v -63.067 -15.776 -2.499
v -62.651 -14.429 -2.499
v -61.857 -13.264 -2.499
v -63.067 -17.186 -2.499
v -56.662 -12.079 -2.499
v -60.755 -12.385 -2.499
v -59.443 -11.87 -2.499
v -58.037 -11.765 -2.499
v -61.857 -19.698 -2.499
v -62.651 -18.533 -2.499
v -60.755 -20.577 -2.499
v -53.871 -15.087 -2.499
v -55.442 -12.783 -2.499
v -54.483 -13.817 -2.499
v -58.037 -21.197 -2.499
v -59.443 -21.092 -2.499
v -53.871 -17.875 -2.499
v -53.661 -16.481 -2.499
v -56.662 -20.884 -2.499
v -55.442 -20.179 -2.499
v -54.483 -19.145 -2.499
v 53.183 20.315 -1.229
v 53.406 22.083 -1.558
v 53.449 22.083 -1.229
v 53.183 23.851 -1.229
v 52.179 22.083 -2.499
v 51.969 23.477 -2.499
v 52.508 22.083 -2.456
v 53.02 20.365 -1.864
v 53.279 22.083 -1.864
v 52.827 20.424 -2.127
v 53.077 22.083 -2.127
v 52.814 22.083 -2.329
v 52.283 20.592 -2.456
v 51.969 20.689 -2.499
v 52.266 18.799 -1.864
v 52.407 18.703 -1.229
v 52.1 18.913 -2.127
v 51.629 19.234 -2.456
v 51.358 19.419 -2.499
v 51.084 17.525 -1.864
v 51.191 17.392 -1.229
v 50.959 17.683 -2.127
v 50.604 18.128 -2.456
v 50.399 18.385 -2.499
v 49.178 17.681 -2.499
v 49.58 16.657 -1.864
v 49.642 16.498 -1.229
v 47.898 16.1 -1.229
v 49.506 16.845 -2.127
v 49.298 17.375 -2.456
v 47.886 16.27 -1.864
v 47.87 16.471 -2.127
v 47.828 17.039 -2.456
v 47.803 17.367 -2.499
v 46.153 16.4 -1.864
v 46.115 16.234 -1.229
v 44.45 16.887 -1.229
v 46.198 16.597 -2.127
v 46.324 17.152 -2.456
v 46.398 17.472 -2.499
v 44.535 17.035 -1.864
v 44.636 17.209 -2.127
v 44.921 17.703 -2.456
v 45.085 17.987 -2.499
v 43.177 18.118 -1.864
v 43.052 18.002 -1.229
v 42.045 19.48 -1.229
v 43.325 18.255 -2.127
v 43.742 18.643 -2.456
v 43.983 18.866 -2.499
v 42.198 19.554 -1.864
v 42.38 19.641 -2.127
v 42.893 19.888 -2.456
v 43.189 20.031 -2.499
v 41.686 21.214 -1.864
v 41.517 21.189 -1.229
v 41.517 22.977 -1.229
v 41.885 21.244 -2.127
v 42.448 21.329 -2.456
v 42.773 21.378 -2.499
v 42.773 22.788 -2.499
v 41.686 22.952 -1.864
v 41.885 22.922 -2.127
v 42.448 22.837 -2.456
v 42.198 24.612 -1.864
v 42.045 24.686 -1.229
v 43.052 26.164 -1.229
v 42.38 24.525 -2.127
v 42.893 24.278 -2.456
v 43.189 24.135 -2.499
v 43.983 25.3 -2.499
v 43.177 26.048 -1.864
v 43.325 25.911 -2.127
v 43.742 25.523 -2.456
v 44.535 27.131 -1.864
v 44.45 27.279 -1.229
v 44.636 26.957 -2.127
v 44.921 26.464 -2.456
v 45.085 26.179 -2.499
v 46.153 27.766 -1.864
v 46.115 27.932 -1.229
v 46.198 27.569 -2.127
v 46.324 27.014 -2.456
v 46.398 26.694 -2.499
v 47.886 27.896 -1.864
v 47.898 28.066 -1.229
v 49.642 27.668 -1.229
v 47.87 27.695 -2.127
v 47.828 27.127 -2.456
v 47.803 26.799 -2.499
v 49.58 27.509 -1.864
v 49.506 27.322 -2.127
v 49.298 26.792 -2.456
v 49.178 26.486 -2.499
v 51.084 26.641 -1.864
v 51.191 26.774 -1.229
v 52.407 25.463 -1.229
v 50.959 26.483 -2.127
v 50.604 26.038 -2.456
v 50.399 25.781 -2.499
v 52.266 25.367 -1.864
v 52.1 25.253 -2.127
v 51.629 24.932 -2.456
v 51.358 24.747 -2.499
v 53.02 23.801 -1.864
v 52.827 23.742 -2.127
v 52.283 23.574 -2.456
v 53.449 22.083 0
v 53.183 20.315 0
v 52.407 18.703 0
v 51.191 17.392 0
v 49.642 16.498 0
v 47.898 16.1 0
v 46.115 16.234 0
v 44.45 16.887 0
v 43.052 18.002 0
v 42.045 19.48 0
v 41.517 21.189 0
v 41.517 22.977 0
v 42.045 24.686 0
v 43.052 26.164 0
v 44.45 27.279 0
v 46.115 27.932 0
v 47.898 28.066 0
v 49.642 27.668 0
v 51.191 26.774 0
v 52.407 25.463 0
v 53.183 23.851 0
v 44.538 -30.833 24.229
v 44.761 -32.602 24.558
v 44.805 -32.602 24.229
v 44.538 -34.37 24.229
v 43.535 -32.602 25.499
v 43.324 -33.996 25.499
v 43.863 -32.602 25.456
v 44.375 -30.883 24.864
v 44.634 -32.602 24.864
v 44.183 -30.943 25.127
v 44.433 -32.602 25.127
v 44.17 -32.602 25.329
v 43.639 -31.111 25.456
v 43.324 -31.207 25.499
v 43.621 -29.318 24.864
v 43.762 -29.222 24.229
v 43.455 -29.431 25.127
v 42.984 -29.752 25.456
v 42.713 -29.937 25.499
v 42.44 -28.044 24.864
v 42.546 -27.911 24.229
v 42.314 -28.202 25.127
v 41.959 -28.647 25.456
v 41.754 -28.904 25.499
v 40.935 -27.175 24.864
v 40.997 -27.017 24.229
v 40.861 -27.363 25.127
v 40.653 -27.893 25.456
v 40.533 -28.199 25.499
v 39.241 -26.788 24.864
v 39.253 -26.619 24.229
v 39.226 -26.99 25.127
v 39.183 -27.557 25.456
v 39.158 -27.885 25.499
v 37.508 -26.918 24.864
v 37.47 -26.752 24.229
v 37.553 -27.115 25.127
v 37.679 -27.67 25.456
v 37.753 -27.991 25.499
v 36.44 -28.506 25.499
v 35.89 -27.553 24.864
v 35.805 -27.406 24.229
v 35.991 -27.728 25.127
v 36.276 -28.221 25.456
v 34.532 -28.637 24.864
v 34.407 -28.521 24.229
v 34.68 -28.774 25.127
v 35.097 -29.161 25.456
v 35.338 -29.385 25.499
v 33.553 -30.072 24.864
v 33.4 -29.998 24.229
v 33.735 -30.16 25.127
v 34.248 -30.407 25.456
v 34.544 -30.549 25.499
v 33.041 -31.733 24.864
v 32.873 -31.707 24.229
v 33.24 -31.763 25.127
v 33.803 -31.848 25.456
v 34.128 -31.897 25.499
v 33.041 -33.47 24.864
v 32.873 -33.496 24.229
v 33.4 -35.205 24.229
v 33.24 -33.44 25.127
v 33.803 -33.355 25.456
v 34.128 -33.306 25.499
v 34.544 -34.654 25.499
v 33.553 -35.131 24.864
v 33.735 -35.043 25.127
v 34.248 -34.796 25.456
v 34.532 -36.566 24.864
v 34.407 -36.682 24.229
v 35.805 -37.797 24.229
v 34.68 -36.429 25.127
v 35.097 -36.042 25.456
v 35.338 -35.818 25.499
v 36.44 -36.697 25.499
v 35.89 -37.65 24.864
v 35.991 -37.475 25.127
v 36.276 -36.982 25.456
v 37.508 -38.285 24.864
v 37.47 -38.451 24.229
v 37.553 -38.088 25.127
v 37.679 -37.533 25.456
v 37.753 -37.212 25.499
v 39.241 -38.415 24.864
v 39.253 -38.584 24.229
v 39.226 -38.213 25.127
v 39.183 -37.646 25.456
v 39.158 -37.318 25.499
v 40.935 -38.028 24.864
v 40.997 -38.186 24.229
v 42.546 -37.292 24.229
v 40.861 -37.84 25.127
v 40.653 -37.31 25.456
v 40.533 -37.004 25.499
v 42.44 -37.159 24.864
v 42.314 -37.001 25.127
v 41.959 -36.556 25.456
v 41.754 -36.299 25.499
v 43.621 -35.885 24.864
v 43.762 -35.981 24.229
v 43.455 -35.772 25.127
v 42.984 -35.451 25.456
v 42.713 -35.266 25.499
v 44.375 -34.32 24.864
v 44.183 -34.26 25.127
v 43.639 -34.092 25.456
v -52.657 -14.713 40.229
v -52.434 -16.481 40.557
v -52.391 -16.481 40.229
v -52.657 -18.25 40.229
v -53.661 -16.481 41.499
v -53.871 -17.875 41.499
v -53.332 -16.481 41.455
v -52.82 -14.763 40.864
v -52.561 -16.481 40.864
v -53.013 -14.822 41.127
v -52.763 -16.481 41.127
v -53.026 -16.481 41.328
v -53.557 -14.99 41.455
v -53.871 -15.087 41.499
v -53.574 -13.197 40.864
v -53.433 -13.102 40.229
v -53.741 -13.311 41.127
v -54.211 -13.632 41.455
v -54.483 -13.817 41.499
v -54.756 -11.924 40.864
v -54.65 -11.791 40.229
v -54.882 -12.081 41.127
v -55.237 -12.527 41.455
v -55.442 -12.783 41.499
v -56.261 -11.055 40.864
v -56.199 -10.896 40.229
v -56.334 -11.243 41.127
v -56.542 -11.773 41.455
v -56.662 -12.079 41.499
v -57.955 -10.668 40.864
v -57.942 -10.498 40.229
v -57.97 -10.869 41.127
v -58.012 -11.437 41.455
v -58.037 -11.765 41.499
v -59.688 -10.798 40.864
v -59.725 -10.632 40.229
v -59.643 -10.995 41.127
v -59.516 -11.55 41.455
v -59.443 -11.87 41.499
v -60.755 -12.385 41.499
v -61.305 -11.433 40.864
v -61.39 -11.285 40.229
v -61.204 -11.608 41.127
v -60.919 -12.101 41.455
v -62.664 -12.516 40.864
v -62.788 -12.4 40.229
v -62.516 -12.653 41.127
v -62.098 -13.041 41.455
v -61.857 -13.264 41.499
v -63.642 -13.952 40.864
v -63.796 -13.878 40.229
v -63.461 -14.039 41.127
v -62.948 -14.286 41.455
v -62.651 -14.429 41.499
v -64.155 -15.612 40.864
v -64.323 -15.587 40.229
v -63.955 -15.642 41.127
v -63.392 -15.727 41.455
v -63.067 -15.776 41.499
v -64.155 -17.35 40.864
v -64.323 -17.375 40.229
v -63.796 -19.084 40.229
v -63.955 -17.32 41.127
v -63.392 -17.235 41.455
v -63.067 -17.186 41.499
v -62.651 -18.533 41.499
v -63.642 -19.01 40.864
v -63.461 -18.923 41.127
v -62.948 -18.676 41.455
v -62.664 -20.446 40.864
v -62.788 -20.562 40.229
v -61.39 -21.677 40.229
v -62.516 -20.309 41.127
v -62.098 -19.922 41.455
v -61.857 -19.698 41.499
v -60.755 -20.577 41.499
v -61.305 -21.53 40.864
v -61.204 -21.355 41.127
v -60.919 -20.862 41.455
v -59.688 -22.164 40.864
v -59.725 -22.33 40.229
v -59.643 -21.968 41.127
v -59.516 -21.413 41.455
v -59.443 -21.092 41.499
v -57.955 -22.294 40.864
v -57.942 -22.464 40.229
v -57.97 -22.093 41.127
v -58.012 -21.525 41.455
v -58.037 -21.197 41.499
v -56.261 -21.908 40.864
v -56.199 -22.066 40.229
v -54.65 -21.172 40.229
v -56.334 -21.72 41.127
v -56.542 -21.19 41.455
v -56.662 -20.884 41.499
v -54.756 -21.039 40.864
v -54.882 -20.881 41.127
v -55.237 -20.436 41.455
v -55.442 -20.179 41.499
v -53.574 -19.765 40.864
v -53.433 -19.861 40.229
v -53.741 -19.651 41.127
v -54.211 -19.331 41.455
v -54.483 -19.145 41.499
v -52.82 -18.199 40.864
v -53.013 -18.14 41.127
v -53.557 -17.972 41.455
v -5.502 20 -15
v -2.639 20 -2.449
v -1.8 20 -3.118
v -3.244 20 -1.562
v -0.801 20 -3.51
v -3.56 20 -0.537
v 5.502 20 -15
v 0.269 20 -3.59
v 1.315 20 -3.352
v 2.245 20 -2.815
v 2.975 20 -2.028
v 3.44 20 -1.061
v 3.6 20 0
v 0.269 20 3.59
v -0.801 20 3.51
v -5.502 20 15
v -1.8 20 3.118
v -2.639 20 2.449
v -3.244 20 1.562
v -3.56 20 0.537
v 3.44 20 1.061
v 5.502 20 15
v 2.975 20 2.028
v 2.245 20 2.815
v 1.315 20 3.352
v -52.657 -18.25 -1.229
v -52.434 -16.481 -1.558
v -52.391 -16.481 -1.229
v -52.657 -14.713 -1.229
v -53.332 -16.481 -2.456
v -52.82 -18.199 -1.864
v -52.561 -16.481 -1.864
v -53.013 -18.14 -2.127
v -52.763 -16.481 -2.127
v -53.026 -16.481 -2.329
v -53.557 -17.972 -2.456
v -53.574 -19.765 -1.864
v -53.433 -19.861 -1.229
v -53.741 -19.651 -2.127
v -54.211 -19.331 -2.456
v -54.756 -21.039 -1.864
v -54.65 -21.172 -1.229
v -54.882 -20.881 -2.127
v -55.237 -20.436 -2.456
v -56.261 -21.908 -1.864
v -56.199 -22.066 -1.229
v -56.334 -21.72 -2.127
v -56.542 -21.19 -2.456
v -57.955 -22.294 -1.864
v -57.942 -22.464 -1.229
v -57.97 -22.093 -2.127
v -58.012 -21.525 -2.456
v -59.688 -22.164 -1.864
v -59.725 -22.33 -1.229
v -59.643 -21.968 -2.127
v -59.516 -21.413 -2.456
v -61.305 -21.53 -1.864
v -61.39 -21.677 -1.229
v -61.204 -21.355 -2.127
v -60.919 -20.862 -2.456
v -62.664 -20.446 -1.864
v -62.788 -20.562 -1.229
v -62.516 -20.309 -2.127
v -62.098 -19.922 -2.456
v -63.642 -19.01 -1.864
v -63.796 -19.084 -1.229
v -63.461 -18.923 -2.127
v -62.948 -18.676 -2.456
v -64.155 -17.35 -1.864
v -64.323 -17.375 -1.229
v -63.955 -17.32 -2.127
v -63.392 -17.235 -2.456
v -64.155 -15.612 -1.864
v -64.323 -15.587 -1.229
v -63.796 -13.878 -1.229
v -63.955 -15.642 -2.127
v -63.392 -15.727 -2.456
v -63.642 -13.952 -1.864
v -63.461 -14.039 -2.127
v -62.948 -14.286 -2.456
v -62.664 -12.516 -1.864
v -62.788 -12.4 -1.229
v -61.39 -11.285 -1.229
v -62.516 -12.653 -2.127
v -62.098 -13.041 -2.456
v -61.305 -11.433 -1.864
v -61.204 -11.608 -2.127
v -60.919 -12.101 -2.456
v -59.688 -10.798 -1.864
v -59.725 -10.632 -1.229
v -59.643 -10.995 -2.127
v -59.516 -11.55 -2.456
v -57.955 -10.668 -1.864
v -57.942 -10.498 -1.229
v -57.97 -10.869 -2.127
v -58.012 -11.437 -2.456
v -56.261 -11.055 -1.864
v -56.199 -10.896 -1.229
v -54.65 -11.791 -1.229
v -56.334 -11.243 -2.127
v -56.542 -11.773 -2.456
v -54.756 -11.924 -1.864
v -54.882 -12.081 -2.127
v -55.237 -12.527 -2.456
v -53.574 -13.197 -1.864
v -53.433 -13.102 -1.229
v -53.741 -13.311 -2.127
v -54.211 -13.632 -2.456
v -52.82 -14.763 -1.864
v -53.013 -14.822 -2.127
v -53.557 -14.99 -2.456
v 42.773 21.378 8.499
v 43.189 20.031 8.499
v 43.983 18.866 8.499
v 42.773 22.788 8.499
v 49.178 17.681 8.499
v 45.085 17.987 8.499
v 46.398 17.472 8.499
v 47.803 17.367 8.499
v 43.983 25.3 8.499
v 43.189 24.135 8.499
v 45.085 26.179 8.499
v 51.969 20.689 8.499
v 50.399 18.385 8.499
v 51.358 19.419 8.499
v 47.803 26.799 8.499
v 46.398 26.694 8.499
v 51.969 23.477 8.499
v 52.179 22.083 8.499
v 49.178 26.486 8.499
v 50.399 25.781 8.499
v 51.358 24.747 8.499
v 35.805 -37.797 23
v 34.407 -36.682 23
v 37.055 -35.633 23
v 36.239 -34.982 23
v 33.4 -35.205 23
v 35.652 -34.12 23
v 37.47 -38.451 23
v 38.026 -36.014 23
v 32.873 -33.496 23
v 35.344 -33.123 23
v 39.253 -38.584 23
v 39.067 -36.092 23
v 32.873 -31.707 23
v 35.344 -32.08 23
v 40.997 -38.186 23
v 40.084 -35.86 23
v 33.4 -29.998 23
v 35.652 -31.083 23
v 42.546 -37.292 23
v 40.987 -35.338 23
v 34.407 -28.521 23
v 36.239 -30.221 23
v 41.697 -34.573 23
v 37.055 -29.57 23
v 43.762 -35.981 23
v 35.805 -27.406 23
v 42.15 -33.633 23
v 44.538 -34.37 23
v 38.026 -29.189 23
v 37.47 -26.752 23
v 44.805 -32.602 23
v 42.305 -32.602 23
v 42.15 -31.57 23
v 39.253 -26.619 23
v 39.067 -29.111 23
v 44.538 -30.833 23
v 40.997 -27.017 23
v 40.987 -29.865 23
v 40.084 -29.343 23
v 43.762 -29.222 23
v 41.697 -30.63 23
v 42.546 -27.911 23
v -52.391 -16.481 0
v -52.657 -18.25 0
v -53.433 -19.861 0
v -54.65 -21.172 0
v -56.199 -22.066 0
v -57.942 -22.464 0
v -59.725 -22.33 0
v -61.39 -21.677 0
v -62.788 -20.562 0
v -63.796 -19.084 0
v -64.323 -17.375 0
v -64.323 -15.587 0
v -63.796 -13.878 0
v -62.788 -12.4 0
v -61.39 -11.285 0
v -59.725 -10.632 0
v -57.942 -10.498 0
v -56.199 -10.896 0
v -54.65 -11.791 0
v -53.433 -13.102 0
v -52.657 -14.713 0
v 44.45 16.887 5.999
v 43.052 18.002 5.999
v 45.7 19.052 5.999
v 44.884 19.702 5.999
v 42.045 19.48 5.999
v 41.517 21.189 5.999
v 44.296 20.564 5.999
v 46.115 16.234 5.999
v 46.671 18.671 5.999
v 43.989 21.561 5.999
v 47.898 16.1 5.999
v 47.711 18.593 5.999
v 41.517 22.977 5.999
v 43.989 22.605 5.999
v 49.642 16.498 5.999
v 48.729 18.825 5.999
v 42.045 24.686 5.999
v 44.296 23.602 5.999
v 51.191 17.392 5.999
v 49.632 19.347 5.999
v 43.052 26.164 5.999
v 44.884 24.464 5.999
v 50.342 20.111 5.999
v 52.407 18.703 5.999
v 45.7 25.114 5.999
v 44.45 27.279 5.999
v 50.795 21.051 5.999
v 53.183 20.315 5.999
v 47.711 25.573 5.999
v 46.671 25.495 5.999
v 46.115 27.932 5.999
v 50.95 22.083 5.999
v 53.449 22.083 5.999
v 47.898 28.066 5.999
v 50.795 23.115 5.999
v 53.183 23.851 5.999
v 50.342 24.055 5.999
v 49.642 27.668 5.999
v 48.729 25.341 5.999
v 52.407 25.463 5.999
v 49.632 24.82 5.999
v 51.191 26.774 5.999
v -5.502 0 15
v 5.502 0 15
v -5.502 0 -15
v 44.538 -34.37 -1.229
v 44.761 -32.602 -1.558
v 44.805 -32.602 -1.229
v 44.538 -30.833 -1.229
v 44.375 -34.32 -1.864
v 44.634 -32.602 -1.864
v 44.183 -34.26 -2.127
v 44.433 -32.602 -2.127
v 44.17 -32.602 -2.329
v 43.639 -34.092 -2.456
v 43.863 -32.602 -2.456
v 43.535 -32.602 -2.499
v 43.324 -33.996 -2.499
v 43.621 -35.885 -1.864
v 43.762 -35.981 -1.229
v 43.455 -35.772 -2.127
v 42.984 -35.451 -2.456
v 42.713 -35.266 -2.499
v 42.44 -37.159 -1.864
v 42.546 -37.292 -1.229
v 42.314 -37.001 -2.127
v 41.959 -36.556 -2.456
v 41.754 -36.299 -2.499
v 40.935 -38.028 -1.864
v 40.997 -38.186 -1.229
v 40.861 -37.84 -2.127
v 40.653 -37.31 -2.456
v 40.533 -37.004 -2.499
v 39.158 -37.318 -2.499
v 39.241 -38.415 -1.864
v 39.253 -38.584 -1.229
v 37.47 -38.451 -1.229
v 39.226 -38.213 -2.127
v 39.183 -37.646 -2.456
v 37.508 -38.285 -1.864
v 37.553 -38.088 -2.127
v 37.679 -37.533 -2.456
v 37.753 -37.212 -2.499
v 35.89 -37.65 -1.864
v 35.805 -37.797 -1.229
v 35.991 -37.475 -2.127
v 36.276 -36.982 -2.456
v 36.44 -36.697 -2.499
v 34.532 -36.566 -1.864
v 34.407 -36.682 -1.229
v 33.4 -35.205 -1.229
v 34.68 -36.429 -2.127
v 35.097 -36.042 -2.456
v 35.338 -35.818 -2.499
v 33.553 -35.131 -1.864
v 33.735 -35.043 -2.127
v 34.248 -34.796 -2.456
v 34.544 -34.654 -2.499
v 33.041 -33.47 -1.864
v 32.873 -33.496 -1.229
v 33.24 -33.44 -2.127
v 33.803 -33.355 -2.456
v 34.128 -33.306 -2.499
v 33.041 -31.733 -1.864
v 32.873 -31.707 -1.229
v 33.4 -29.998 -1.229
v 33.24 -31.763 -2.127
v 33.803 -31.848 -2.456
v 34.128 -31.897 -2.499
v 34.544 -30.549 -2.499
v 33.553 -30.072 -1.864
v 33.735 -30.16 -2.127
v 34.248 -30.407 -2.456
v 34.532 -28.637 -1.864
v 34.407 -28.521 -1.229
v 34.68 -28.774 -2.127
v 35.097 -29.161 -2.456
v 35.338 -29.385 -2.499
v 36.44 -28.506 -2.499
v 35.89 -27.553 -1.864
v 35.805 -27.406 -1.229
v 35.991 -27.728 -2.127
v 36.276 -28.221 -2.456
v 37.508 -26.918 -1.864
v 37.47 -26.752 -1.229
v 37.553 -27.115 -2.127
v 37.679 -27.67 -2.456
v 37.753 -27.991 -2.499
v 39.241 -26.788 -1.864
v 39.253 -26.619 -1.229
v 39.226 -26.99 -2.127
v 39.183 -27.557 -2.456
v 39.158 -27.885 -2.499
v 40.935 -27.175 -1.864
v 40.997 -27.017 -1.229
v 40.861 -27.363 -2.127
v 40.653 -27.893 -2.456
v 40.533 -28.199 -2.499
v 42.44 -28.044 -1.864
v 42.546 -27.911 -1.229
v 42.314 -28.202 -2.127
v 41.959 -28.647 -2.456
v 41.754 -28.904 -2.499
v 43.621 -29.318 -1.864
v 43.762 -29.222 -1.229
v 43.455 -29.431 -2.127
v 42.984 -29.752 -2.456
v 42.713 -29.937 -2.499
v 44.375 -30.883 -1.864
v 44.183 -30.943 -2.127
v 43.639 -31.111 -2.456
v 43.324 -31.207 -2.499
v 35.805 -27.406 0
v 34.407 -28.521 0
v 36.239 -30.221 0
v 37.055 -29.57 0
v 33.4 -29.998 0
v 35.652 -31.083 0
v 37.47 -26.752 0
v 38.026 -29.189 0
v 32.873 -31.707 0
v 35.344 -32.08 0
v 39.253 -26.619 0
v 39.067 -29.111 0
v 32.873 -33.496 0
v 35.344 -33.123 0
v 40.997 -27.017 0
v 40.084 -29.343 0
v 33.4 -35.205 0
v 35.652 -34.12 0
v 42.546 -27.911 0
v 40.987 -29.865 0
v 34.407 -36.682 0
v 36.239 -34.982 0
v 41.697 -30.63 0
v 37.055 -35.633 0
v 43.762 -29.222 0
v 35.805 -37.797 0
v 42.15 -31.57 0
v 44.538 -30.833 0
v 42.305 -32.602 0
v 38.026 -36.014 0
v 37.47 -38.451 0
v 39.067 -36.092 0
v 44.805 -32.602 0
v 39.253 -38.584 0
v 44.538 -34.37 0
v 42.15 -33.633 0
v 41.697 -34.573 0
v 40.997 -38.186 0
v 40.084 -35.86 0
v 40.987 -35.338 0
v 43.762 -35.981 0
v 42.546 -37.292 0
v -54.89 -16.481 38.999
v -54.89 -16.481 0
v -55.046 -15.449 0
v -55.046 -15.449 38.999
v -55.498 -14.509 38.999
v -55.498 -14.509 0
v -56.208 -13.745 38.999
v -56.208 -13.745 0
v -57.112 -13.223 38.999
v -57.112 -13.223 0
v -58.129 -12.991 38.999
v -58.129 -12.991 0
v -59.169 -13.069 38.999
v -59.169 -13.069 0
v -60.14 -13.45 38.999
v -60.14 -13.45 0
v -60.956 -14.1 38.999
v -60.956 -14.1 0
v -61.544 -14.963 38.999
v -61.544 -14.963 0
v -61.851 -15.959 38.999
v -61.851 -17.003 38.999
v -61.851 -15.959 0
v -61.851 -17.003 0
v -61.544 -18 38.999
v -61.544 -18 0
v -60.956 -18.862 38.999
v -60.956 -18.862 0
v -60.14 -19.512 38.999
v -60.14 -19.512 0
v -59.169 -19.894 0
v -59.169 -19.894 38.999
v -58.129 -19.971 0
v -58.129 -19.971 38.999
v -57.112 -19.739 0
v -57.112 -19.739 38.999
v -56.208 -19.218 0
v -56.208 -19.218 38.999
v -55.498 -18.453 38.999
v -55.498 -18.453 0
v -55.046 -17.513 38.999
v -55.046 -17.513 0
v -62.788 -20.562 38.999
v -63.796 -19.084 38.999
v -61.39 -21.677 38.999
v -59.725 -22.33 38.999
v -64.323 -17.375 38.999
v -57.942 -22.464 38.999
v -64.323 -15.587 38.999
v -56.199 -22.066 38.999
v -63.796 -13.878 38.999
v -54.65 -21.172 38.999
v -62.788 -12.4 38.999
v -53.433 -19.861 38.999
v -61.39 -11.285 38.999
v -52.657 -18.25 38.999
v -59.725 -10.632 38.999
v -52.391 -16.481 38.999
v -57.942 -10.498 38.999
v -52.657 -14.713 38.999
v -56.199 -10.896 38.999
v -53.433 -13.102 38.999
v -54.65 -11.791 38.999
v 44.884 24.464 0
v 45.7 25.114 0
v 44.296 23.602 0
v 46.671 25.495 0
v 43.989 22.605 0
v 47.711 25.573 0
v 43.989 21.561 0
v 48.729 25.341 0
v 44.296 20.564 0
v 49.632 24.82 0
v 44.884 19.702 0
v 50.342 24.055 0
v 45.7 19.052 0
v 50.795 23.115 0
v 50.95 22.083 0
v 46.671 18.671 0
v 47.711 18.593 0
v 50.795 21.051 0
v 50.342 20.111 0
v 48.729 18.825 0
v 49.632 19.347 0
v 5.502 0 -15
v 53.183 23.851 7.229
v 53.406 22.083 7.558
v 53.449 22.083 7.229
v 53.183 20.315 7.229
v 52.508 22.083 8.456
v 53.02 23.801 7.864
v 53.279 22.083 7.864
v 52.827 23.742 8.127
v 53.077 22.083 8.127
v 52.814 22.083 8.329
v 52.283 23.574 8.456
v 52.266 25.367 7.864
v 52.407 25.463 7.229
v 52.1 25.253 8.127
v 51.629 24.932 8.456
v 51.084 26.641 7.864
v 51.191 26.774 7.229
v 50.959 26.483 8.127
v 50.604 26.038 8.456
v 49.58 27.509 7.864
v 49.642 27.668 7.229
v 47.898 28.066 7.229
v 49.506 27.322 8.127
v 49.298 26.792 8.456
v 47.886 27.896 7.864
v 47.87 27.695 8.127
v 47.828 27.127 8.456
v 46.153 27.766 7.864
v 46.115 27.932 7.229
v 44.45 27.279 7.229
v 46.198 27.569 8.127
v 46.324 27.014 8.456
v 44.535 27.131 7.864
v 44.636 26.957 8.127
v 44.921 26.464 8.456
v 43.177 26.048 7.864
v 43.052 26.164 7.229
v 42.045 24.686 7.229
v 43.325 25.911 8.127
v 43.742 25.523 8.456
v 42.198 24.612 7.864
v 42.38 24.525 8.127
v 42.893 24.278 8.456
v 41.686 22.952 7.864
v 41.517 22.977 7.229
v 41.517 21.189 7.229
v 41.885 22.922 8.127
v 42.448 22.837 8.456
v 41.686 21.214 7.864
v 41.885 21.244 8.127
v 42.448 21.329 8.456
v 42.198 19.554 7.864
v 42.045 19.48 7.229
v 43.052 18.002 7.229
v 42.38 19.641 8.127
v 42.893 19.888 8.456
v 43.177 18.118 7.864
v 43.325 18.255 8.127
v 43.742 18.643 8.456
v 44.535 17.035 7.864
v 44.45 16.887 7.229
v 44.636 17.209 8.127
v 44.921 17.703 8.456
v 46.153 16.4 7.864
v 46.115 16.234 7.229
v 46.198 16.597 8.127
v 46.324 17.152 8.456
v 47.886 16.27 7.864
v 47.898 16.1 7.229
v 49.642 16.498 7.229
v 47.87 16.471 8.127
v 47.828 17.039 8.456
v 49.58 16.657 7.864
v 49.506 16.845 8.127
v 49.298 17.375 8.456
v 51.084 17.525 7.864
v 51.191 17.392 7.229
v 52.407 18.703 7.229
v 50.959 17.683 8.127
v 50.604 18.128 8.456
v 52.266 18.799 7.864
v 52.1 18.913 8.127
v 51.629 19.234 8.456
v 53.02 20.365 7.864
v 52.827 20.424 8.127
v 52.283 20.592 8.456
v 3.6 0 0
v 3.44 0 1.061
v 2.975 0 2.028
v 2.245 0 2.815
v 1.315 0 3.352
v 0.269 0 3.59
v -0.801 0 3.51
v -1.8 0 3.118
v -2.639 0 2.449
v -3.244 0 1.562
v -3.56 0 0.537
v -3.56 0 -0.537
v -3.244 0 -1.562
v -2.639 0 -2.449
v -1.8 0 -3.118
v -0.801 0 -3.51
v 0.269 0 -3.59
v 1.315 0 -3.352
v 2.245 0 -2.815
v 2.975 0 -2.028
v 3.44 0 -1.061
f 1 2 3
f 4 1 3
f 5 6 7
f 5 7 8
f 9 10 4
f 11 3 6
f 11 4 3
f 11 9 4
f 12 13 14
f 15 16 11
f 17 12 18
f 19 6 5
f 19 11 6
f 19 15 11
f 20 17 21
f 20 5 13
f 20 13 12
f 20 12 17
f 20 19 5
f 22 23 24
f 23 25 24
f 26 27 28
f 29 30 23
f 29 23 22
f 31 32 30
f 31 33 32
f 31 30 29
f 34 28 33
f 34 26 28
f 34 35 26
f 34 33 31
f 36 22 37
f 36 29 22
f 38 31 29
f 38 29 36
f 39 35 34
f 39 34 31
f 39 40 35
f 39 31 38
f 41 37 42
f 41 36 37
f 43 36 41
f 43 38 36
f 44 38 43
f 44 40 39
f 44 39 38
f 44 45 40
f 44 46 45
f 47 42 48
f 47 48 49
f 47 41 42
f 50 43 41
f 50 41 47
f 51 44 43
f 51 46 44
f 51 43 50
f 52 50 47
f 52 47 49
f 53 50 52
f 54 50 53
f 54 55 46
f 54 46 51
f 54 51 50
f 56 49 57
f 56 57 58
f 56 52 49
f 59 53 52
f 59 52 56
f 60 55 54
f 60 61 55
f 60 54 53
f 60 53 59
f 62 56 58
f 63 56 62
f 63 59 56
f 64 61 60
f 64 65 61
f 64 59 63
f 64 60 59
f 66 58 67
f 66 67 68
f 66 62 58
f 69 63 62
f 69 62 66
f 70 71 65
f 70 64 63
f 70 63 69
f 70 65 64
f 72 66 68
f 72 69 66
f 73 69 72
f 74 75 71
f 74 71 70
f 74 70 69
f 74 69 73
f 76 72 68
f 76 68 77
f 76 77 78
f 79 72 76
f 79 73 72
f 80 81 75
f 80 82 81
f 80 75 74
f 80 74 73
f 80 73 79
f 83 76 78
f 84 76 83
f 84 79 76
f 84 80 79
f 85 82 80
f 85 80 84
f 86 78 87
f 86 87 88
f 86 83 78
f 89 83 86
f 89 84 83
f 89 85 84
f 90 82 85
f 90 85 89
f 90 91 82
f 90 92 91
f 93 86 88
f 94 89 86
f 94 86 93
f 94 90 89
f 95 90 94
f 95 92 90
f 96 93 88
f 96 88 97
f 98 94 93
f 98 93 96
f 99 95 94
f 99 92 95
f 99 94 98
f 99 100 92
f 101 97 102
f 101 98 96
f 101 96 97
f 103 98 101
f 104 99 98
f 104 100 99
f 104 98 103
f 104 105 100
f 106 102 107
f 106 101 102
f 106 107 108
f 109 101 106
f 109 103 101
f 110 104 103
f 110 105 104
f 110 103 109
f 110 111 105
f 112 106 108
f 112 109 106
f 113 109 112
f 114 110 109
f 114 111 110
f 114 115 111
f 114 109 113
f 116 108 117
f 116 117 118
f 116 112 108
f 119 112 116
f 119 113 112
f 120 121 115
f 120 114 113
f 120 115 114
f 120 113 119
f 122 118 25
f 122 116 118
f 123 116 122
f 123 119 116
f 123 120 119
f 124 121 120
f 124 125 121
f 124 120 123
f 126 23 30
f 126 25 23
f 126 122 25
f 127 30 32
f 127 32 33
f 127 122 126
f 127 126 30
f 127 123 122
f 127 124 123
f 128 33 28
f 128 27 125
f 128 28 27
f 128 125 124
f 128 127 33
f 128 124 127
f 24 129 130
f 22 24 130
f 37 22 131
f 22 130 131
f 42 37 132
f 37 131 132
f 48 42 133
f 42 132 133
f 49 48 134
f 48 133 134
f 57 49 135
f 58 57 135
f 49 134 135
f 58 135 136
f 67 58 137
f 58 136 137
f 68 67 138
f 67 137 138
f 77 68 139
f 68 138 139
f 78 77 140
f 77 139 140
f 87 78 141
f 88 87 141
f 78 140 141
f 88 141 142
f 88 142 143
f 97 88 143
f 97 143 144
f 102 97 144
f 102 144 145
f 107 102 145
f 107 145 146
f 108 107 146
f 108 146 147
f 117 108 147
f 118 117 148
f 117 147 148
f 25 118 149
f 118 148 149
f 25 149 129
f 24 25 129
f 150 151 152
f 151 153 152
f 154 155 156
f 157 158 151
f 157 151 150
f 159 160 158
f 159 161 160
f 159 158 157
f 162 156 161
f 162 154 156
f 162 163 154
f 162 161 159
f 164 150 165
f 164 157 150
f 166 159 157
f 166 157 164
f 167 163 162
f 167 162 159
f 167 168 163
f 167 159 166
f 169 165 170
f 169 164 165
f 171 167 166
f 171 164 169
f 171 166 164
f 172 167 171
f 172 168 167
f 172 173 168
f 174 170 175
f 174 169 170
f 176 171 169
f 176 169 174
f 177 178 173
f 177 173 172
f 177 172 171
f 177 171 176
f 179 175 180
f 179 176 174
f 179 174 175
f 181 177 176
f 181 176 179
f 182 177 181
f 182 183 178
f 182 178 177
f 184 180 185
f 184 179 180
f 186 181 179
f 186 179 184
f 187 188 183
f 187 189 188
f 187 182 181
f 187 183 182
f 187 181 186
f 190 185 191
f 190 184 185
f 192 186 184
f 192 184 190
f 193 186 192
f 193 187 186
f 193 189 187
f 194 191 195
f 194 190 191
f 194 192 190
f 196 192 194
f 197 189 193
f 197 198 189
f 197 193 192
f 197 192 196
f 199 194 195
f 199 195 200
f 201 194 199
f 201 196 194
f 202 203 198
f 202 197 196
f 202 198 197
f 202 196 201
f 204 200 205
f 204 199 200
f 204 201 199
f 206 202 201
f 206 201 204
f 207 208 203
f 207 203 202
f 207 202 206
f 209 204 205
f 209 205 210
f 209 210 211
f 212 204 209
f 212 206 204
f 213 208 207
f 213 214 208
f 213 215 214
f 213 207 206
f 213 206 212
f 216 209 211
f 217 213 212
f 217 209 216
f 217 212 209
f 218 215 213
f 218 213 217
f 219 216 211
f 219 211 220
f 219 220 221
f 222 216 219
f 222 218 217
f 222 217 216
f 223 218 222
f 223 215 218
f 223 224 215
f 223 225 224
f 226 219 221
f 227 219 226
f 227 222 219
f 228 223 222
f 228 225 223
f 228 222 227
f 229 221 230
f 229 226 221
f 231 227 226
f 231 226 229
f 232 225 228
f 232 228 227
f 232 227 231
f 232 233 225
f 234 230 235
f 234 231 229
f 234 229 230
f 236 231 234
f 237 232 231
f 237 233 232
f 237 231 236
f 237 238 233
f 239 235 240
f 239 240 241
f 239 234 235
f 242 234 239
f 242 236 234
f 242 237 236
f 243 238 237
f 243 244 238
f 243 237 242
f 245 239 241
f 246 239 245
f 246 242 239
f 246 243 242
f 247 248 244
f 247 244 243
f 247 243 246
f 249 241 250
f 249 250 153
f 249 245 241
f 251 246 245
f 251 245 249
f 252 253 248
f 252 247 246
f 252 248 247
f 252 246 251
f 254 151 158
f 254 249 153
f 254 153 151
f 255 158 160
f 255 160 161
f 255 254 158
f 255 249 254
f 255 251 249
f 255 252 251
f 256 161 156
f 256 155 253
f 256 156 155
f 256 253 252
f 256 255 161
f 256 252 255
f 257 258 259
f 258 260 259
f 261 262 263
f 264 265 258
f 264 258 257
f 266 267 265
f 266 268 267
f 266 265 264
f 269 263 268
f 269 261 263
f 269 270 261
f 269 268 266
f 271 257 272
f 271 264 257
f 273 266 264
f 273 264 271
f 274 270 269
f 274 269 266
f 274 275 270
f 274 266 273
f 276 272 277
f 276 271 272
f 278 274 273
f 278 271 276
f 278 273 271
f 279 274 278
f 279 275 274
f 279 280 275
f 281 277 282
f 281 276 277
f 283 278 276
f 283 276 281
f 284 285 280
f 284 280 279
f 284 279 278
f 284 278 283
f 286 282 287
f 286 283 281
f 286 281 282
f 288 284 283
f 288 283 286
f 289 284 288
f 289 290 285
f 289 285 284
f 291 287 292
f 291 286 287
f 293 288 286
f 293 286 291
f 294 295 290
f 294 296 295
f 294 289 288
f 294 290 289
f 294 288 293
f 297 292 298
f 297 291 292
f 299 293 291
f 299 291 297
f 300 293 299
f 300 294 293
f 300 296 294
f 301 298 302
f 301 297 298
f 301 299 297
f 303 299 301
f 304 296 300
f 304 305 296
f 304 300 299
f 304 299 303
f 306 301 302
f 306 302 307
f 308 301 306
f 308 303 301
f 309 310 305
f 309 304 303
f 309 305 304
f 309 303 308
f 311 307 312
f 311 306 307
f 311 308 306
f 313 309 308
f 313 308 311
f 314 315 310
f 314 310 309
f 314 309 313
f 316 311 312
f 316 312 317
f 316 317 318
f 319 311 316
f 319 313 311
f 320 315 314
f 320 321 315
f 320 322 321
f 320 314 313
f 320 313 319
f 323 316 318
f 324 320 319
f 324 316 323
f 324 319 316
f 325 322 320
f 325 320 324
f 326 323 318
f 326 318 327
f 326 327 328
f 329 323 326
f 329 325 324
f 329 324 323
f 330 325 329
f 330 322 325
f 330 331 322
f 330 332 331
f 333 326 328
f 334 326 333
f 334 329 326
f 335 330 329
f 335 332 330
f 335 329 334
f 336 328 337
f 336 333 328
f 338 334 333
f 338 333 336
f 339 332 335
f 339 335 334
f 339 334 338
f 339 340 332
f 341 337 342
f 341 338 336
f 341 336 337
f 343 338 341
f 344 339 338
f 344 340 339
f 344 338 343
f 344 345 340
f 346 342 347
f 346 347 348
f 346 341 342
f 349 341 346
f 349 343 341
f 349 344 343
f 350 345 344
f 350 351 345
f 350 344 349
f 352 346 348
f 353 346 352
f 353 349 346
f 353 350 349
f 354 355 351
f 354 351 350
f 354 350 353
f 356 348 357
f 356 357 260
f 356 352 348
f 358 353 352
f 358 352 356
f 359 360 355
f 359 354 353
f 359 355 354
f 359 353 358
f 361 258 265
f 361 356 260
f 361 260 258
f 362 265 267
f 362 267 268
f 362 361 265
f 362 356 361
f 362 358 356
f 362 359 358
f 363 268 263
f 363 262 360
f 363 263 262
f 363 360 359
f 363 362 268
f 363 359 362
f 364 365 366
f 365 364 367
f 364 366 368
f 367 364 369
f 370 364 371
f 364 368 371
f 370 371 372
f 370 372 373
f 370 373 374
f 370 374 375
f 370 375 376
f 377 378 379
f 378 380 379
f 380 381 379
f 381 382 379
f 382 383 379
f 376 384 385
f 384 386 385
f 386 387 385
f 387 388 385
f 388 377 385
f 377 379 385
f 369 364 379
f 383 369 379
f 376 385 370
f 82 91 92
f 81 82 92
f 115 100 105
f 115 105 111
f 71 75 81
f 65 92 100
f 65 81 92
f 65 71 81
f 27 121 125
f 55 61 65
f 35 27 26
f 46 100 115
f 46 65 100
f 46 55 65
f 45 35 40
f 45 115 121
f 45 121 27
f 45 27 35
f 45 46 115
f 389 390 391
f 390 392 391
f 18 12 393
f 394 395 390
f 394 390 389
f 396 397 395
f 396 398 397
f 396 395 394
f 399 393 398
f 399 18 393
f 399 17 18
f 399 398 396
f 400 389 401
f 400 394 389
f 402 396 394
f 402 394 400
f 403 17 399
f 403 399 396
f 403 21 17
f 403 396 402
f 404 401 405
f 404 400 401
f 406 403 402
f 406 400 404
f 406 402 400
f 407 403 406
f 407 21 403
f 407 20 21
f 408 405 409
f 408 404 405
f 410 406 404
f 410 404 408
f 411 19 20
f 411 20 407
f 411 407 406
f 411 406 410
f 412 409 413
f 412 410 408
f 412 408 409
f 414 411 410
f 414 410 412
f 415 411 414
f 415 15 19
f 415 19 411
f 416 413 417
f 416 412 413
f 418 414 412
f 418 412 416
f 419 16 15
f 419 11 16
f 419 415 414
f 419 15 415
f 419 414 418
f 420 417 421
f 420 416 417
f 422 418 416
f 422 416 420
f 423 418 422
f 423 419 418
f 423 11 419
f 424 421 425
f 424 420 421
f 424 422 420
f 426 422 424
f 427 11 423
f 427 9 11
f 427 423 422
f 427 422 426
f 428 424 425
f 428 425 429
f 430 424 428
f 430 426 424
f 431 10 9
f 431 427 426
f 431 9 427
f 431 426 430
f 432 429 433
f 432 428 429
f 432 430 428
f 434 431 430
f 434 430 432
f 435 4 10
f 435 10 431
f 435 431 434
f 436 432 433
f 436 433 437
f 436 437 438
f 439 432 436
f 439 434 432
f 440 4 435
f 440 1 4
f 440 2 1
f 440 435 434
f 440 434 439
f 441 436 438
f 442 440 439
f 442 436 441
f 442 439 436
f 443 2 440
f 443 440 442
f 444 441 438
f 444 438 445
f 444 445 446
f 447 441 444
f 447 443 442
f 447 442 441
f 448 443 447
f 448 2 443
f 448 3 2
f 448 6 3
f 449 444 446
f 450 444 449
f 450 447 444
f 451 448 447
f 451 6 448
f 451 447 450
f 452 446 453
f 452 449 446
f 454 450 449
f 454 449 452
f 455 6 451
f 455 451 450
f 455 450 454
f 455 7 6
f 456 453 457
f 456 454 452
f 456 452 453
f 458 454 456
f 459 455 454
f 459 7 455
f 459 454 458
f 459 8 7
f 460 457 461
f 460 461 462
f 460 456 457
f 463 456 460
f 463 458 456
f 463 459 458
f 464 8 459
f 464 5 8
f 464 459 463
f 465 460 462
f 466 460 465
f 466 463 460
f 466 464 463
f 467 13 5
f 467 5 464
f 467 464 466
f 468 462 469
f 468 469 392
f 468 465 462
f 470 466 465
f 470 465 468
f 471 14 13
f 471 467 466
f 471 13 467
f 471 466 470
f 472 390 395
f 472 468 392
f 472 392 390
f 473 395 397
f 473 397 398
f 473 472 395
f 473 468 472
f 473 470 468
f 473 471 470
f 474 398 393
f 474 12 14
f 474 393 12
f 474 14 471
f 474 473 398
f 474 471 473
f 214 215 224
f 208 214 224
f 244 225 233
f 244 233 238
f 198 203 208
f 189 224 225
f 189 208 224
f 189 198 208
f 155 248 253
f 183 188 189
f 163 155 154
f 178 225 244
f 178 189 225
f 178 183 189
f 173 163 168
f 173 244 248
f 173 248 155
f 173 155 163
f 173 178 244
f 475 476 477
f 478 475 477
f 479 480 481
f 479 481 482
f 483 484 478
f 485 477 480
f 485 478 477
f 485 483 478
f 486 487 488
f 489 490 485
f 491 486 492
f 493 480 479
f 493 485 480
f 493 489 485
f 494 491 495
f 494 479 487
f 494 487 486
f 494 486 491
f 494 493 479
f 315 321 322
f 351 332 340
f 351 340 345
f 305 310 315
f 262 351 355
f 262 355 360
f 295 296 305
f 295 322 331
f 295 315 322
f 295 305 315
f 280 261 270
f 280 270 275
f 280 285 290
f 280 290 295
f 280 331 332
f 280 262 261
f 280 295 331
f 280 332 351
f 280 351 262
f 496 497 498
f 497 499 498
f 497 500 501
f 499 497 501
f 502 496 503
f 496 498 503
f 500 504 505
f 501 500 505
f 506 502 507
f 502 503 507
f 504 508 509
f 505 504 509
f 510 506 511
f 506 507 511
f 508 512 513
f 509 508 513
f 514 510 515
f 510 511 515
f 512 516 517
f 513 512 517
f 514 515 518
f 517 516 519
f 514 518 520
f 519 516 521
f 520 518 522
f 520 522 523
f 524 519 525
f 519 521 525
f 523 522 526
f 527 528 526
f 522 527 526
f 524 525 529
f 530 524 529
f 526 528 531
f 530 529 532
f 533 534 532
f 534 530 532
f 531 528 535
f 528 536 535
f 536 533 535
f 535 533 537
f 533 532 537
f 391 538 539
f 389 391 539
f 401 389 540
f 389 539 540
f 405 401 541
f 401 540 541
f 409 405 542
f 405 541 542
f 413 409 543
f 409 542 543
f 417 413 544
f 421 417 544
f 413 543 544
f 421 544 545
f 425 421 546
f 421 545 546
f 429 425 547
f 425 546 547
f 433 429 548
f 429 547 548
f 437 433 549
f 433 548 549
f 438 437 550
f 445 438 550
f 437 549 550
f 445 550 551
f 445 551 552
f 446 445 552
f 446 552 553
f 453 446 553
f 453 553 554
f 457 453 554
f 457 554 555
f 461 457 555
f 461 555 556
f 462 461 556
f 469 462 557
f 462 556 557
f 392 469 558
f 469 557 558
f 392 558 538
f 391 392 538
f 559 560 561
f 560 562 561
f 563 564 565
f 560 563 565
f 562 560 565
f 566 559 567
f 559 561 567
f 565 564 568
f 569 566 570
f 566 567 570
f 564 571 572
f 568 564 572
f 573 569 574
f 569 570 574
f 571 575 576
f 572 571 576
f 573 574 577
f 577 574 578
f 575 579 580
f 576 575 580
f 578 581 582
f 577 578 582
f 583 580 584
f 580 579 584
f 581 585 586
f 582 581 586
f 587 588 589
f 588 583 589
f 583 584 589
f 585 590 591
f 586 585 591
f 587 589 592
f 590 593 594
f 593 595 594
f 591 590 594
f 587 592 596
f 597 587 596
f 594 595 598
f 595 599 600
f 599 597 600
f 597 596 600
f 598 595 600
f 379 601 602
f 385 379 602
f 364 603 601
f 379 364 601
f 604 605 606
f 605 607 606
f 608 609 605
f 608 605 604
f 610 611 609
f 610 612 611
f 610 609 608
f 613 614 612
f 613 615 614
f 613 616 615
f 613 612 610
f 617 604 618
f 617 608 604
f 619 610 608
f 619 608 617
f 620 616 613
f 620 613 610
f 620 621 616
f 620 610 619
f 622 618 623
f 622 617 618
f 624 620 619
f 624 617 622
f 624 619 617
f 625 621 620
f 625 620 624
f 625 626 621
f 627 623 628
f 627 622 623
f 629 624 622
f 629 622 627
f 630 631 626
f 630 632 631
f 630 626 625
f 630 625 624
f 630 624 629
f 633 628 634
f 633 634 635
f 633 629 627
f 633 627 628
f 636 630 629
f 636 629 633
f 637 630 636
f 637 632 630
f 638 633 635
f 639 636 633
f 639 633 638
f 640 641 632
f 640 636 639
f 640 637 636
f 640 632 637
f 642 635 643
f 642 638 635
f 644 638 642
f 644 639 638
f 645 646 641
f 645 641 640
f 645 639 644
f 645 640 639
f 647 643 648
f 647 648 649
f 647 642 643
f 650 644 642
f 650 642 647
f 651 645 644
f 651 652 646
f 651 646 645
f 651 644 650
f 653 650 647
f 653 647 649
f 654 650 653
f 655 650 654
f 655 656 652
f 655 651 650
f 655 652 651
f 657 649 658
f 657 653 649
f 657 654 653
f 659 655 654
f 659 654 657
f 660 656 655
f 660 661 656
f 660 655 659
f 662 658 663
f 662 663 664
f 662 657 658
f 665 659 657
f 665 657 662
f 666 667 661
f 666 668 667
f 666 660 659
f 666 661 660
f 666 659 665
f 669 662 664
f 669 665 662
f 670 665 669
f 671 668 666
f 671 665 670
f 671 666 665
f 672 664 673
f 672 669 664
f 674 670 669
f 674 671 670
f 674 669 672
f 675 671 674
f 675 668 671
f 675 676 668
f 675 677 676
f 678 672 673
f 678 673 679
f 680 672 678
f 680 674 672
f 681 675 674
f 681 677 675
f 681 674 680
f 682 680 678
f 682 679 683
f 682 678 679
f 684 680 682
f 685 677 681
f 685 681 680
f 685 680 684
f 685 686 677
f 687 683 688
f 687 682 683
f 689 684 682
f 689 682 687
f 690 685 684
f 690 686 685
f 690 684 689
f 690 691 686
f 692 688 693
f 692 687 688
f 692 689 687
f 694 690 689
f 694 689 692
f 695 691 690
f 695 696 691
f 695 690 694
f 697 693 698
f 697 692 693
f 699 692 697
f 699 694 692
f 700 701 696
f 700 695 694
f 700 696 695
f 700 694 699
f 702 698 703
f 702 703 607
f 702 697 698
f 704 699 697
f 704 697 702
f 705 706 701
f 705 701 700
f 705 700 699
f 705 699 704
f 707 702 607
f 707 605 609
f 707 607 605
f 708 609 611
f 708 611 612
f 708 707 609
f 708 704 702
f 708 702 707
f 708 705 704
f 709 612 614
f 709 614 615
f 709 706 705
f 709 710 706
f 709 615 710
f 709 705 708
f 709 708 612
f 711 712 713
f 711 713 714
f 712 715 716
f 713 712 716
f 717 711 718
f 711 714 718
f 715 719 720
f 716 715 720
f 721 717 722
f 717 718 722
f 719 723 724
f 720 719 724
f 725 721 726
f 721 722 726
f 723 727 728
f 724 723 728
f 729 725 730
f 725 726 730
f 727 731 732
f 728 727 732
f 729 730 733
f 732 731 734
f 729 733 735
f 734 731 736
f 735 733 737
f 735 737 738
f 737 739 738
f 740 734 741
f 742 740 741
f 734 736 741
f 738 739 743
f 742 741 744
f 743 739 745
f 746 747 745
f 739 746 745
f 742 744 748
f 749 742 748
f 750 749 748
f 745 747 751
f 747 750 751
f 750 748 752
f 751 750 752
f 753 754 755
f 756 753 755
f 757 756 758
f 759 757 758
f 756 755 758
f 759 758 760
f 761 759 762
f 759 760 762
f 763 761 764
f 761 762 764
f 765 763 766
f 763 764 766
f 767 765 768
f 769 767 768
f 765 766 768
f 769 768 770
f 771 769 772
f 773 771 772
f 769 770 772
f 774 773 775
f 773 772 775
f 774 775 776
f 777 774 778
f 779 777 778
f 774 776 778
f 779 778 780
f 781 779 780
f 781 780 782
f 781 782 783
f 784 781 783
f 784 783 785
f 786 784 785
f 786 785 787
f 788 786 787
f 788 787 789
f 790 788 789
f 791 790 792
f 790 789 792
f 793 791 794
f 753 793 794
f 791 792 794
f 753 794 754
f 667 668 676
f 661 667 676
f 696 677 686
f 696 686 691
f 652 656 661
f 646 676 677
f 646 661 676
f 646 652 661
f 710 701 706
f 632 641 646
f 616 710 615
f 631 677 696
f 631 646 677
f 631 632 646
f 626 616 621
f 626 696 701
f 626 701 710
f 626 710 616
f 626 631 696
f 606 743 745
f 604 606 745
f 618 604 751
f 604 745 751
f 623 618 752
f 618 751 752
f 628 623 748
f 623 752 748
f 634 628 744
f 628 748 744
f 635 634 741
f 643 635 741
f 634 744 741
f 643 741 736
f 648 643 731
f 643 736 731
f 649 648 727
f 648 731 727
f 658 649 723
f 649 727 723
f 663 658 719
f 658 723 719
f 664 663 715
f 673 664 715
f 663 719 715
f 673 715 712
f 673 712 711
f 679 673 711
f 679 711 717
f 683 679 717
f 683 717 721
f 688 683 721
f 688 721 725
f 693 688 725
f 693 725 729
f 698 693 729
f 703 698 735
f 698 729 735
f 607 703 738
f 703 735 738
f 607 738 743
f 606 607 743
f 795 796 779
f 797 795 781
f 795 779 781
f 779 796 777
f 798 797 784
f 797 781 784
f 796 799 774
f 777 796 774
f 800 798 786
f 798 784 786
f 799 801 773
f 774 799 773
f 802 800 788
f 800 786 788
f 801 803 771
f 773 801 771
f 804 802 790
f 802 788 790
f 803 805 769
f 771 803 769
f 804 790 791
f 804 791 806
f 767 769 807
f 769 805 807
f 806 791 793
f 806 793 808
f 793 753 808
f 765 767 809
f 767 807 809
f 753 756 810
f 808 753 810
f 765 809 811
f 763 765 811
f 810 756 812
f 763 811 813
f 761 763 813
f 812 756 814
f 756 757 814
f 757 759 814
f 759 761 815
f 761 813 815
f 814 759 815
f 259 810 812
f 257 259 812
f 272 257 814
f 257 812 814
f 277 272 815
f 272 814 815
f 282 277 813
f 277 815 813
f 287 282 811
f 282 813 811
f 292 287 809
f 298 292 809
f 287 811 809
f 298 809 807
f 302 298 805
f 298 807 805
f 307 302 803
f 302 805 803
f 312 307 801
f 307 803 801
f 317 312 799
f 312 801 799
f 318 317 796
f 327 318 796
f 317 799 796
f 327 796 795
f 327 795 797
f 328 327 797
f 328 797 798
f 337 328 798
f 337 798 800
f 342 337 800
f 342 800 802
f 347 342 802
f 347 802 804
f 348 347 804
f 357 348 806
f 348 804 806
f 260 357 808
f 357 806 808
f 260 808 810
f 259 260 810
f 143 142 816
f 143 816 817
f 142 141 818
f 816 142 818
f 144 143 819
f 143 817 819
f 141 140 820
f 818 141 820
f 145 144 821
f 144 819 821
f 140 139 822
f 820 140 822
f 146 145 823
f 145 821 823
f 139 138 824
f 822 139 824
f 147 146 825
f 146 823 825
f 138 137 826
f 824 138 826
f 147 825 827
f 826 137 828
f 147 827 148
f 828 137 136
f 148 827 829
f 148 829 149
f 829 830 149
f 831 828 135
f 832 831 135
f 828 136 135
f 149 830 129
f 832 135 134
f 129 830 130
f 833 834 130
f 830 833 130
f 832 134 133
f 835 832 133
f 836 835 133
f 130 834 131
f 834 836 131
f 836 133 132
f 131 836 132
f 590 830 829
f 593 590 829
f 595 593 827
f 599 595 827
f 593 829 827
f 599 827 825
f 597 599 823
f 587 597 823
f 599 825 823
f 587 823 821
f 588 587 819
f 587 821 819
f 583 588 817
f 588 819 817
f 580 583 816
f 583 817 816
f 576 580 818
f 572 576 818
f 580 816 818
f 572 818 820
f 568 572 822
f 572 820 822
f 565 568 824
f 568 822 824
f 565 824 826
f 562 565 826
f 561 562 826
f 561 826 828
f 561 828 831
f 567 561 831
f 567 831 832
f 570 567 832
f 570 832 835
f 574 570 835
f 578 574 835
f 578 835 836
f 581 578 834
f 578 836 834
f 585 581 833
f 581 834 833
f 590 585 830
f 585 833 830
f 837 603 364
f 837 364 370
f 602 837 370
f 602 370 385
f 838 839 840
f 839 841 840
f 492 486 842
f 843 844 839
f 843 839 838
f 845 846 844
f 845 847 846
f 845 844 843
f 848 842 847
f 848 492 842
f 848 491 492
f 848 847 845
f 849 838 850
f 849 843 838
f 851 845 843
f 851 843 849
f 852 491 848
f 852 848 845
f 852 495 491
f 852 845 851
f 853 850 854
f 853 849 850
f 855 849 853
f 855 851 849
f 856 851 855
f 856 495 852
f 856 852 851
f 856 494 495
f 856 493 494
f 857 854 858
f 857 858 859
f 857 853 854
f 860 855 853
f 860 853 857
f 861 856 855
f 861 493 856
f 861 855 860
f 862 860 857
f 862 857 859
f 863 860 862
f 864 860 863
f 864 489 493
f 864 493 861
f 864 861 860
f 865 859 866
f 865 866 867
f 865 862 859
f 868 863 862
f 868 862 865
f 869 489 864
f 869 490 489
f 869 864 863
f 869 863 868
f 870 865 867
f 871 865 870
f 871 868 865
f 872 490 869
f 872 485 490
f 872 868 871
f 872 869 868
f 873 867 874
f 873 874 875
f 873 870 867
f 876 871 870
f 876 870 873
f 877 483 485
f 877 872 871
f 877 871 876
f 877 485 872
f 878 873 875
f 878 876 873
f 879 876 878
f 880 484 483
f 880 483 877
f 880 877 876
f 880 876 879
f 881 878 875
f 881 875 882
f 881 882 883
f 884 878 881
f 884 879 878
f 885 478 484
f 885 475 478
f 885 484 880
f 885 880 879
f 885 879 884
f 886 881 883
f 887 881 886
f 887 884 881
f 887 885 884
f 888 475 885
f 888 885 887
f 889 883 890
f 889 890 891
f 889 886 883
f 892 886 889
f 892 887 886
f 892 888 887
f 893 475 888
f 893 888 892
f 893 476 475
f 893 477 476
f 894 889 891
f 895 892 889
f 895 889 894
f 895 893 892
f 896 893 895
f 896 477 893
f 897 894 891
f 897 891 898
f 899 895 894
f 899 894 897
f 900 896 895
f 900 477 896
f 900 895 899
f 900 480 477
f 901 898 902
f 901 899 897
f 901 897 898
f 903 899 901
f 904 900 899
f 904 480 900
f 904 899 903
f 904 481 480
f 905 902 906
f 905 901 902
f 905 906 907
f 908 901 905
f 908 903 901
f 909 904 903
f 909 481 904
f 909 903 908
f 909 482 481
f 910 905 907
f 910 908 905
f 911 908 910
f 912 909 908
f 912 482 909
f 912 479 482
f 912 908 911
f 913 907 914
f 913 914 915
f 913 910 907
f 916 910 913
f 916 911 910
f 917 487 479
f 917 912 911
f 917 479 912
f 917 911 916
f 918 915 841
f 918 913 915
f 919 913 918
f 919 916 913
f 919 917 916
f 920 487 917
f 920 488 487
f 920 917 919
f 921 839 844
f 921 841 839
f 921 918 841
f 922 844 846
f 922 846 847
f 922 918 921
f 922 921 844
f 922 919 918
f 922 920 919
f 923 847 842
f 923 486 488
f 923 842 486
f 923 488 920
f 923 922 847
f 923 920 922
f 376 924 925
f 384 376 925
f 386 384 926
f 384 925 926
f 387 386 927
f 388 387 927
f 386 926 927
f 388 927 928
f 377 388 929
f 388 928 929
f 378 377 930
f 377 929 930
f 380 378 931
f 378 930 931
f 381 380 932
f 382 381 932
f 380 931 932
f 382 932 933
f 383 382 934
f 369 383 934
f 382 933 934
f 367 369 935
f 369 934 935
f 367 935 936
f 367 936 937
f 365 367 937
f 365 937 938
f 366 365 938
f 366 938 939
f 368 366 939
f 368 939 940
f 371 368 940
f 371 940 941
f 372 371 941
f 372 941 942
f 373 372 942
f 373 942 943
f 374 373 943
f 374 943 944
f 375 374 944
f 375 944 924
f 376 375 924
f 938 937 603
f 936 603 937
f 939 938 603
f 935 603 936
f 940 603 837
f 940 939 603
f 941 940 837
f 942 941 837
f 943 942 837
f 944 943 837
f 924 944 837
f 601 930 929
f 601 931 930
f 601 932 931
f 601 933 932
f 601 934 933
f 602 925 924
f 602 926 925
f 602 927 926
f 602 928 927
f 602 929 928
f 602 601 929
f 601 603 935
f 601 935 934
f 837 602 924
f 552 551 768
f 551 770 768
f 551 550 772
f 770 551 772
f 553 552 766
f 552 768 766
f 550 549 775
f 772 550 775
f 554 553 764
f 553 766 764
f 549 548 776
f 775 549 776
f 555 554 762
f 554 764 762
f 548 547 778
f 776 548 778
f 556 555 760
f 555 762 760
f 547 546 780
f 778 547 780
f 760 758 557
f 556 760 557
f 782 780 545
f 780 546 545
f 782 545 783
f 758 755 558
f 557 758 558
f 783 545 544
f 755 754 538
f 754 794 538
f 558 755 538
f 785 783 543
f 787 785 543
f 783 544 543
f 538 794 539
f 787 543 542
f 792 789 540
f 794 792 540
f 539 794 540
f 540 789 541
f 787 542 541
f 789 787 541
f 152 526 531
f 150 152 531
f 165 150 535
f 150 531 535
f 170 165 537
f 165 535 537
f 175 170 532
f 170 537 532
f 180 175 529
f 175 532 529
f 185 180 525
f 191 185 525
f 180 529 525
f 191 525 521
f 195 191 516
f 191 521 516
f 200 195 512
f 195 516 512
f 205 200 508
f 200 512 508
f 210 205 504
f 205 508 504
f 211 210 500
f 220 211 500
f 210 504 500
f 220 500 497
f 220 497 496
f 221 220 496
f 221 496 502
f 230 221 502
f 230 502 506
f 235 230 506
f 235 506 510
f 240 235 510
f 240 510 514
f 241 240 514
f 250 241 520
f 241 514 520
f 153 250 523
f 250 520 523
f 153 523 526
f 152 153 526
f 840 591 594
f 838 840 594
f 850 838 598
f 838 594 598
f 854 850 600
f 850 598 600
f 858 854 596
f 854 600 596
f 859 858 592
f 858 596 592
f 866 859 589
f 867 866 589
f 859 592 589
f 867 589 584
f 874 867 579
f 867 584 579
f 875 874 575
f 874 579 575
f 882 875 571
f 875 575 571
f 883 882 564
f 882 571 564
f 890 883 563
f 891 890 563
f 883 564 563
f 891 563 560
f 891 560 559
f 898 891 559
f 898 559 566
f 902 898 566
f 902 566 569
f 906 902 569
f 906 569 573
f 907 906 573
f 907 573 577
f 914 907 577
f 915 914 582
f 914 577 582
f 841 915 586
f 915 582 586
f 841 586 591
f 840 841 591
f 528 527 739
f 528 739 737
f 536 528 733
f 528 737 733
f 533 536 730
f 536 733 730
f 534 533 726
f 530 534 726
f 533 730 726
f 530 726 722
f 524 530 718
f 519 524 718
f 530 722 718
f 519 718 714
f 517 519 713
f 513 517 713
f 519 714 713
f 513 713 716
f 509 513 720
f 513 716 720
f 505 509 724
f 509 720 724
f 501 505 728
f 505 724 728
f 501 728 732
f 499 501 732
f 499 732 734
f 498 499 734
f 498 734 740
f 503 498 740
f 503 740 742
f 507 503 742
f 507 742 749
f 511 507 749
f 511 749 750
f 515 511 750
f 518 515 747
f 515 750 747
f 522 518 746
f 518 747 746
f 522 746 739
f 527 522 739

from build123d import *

# Parameters (mm, degrees)
F0_W      = 11.00328
F0_H      = 29.99994
F1_DEPTH  = 19.99996
F2_R      = 3.60045
F3_DEPTH  = 25.4
F4_R      = 3.50012
F5_DEPTH  = 38.99916
F6_R      = 5.99948
F7_DEPTH  = 2.49936
F8_R      = 5.99948
F9_DEPTH  = 2.49936
F10_R     = 1.27
F11_R     = 3.50012
F12_DEPTH = 22.9997
F13_R     = 5.99948
F14_DEPTH = 2.49936
F15_R     = 5.99948
F16_DEPTH = 2.49936
F17_R     = 1.27
F18_R     = 3.50012
F19_DEPTH = 5.99948
F20_R     = 5.99948
F21_DEPTH = 2.49936
F22_R     = 5.99948
F23_DEPTH = 2.49936
F24_R     = 1.27


with BuildPart() as f1:
    # F0 (on Front) → F1 (new body)
    with BuildSketch(Plane.XZ):
        Rectangle(F0_W, F0_H)
    extrude(amount=-F1_DEPTH)

    # F2 (on face) → F3 (cut)
    with BuildSketch(Plane.XZ):
        Circle(F2_R)
    extrude(amount=-F3_DEPTH, mode=Mode.SUBTRACT)


with BuildPart() as f5:
    # F4 (on Top) → F5 (new body)
    with BuildSketch(Plane.XY):
        with Locations((-58.39036, -16.481152)):
            Circle(F4_R)
    extrude(amount=F5_DEPTH)

    # F6 (on face) → F7 (join)
    with BuildSketch(Plane.XY.offset(38.99916)):
        with Locations((-58.39036, -16.481152)):
            Circle(F6_R)
    extrude(amount=F7_DEPTH)

    # F8 (on face) → F9 (join)
    with BuildSketch(Plane(origin=(0, 0, 0), x_dir=(1, 0, 0), z_dir=(0, 0, -1))):
        with Locations((-58.39036, 16.481152)):
            Circle(F8_R)
    extrude(amount=F9_DEPTH)

    # F10
    f10_edges = [f5.edges().sort_by_distance(p)[0] for p in [
        (-64.38984, -16.481152, -2.49936),
        (-64.38984, -16.481152, 41.49852),
    ]]
    fillet(f10_edges, radius=F10_R)


with BuildPart() as f12:
    # F11 (on Top) → F12 (new body)
    with BuildSketch(Plane.XY):
        with Locations((38.805041, -32.601513)):
            Circle(F11_R)
    extrude(amount=F12_DEPTH)

    # F13 (on face) → F14 (join)
    with BuildSketch(Plane.XY.offset(22.9997)):
        with Locations((38.805041, -32.601513)):
            Circle(F13_R)
    extrude(amount=F14_DEPTH)

    # F15 (on face) → F16 (join)
    with BuildSketch(Plane(origin=(0, 0, 0), x_dir=(1, 0, 0), z_dir=(0, 0, -1))):
        with Locations((38.805041, 32.601513)):
            Circle(F15_R)
    extrude(amount=F16_DEPTH)

    # F17
    f17_edges = [f12.edges().sort_by_distance(p)[0] for p in [
        (32.805561, -32.601513, -2.49936),
        (32.805561, -32.601513, 25.49906),
    ]]
    fillet(f17_edges, radius=F17_R)


with BuildPart() as f19:
    # F18 (on Top) → F19 (new body)
    with BuildSketch(Plane.XY):
        with Locations((47.449935, 22.08305)):
            Circle(F18_R)
    extrude(amount=F19_DEPTH)

    # F20 (on face) → F21 (join)
    with BuildSketch(Plane(origin=(0, 0, 0), x_dir=(1, 0, 0), z_dir=(0, 0, -1))):
        with Locations((47.449935, -22.08305)):
            Circle(F20_R)
    extrude(amount=F21_DEPTH)

    # F22 (on face) → F23 (join)
    with BuildSketch(Plane.XY.offset(5.99948)):
        with Locations((47.449935, 22.08305)):
            Circle(F22_R)
    extrude(amount=F23_DEPTH)

    # F24
    f24_edges = [f19.edges().sort_by_distance(p)[0] for p in [
        (41.450455, 22.08305, 8.49884),
        (41.450455, 22.08305, -2.49936),
    ]]
    fillet(f24_edges, radius=F24_R)


solid = Compound([f1.part, f5.part, f12.part, f19.part])
